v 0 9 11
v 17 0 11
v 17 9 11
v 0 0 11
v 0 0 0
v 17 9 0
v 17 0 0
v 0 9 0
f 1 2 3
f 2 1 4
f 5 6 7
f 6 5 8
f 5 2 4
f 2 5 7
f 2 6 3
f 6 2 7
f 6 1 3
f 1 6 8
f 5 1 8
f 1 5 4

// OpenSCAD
// Generated by SolidPython 1.0.1 on 2020-07-29 00:46:56


cube(size = [17, 9, 11]);
/***********************************************
*********      SolidPython code:      **********
************************************************
 
# import packages: SolidPython
from solid import *
from solid.utils import *
from itertools import chain, combinations, permutations


class Resize:

    def __init__(self, scad_file):
        self.scad_file = scad_file
        #self.scad_file = import_scad(scad_file)
        # cone/cylinder param:
        self.r1 = 0
        self.r2 = 0
        self.h = 0
        # rectangular prism param:
        self.w = 0
        self.l = 0
        # ellipse param:
        self.r = 0

    # import OpenScad code (file name corresponds to shape)


    # classify shape + parameters
    def assign(self, param1, param2, param3):
        if self.scad_file == 'cone.scad':
            self.r1 = param1
            self.r2 = param2
            self.h = param3
        elif self.scad_file == 'cylinder.scad':
            self.r1 = param1
            self.r2 = param2
            self.h = param3
        elif self.scad_file == 'rectangularPrism.scad':
            self.h = param1
            self.l = param2
            self.w = param3
        else:
            self.r = param1
            self.h = param2

    # resize parameters
    def iterate(self):
        x = range(3, 20, 2)
        i = 1
        if self.scad_file == 'cone.scad':
            tempList = list(permutations(x, 2))
            for temp in tempList:
                param1 = temp[0]
                param2 = temp[1]
                filepath = 'produced_scad_files/' + 'cone' + str(param1) + '_' + str(param2) + '_' + '.scad'
                scad_render_to_file(cylinder(h=param1, r1=param2, r2=0), filepath)

        elif self.scad_file == 'cylinder.scad':
            tempList = list(permutations(x, 3))
            for temp in tempList:
                param1 = temp[0]
                param2 = temp[1]
                filepath = 'produced_scad_files/' + 'cylinder' + str(param1) + '_' + str(param2) + '_' + '.scad'
                scad_render_to_file(cylinder(h=param1, r1=param2, r2=param2), filepath)

        elif self.scad_file == 'rectangularPrism.scad':
            tempList = list(permutations(x, 3))
            for temp in tempList:
                param1 = temp[0]
                param2 = temp[1]
                param3 = temp[2]
                filepath = 'produced_scad_files/' + 'rectangularPrism' + str(param1) + '_' + str(param2) + '_' + str(
                    param3) + '.scad'
                scad_render_to_file(cube(size=(param1, param2, param3)), filepath)

        elif self.scad_file == 'ellipse.scad':
            tempList = list(permutations(x, 4))
            for temp in tempList:
                param1 = temp[0]
                param2 = temp[1]
                param3 = temp[2]
                param4 = temp[3]
                filepath = 'produced_scad_files/' + 'ellipse' + str(param1) + '_' + str(param2) + '_' + str(param3) + '_' + str(param4) + '.scad'
                scad_render_to_file(scale([param1, param2, param3])(sphere(r=param4)), filepath)

    def render_to_scadfile(self):
        scad_render_to_file(scad, 'example.scad') 
 
************************************************/
